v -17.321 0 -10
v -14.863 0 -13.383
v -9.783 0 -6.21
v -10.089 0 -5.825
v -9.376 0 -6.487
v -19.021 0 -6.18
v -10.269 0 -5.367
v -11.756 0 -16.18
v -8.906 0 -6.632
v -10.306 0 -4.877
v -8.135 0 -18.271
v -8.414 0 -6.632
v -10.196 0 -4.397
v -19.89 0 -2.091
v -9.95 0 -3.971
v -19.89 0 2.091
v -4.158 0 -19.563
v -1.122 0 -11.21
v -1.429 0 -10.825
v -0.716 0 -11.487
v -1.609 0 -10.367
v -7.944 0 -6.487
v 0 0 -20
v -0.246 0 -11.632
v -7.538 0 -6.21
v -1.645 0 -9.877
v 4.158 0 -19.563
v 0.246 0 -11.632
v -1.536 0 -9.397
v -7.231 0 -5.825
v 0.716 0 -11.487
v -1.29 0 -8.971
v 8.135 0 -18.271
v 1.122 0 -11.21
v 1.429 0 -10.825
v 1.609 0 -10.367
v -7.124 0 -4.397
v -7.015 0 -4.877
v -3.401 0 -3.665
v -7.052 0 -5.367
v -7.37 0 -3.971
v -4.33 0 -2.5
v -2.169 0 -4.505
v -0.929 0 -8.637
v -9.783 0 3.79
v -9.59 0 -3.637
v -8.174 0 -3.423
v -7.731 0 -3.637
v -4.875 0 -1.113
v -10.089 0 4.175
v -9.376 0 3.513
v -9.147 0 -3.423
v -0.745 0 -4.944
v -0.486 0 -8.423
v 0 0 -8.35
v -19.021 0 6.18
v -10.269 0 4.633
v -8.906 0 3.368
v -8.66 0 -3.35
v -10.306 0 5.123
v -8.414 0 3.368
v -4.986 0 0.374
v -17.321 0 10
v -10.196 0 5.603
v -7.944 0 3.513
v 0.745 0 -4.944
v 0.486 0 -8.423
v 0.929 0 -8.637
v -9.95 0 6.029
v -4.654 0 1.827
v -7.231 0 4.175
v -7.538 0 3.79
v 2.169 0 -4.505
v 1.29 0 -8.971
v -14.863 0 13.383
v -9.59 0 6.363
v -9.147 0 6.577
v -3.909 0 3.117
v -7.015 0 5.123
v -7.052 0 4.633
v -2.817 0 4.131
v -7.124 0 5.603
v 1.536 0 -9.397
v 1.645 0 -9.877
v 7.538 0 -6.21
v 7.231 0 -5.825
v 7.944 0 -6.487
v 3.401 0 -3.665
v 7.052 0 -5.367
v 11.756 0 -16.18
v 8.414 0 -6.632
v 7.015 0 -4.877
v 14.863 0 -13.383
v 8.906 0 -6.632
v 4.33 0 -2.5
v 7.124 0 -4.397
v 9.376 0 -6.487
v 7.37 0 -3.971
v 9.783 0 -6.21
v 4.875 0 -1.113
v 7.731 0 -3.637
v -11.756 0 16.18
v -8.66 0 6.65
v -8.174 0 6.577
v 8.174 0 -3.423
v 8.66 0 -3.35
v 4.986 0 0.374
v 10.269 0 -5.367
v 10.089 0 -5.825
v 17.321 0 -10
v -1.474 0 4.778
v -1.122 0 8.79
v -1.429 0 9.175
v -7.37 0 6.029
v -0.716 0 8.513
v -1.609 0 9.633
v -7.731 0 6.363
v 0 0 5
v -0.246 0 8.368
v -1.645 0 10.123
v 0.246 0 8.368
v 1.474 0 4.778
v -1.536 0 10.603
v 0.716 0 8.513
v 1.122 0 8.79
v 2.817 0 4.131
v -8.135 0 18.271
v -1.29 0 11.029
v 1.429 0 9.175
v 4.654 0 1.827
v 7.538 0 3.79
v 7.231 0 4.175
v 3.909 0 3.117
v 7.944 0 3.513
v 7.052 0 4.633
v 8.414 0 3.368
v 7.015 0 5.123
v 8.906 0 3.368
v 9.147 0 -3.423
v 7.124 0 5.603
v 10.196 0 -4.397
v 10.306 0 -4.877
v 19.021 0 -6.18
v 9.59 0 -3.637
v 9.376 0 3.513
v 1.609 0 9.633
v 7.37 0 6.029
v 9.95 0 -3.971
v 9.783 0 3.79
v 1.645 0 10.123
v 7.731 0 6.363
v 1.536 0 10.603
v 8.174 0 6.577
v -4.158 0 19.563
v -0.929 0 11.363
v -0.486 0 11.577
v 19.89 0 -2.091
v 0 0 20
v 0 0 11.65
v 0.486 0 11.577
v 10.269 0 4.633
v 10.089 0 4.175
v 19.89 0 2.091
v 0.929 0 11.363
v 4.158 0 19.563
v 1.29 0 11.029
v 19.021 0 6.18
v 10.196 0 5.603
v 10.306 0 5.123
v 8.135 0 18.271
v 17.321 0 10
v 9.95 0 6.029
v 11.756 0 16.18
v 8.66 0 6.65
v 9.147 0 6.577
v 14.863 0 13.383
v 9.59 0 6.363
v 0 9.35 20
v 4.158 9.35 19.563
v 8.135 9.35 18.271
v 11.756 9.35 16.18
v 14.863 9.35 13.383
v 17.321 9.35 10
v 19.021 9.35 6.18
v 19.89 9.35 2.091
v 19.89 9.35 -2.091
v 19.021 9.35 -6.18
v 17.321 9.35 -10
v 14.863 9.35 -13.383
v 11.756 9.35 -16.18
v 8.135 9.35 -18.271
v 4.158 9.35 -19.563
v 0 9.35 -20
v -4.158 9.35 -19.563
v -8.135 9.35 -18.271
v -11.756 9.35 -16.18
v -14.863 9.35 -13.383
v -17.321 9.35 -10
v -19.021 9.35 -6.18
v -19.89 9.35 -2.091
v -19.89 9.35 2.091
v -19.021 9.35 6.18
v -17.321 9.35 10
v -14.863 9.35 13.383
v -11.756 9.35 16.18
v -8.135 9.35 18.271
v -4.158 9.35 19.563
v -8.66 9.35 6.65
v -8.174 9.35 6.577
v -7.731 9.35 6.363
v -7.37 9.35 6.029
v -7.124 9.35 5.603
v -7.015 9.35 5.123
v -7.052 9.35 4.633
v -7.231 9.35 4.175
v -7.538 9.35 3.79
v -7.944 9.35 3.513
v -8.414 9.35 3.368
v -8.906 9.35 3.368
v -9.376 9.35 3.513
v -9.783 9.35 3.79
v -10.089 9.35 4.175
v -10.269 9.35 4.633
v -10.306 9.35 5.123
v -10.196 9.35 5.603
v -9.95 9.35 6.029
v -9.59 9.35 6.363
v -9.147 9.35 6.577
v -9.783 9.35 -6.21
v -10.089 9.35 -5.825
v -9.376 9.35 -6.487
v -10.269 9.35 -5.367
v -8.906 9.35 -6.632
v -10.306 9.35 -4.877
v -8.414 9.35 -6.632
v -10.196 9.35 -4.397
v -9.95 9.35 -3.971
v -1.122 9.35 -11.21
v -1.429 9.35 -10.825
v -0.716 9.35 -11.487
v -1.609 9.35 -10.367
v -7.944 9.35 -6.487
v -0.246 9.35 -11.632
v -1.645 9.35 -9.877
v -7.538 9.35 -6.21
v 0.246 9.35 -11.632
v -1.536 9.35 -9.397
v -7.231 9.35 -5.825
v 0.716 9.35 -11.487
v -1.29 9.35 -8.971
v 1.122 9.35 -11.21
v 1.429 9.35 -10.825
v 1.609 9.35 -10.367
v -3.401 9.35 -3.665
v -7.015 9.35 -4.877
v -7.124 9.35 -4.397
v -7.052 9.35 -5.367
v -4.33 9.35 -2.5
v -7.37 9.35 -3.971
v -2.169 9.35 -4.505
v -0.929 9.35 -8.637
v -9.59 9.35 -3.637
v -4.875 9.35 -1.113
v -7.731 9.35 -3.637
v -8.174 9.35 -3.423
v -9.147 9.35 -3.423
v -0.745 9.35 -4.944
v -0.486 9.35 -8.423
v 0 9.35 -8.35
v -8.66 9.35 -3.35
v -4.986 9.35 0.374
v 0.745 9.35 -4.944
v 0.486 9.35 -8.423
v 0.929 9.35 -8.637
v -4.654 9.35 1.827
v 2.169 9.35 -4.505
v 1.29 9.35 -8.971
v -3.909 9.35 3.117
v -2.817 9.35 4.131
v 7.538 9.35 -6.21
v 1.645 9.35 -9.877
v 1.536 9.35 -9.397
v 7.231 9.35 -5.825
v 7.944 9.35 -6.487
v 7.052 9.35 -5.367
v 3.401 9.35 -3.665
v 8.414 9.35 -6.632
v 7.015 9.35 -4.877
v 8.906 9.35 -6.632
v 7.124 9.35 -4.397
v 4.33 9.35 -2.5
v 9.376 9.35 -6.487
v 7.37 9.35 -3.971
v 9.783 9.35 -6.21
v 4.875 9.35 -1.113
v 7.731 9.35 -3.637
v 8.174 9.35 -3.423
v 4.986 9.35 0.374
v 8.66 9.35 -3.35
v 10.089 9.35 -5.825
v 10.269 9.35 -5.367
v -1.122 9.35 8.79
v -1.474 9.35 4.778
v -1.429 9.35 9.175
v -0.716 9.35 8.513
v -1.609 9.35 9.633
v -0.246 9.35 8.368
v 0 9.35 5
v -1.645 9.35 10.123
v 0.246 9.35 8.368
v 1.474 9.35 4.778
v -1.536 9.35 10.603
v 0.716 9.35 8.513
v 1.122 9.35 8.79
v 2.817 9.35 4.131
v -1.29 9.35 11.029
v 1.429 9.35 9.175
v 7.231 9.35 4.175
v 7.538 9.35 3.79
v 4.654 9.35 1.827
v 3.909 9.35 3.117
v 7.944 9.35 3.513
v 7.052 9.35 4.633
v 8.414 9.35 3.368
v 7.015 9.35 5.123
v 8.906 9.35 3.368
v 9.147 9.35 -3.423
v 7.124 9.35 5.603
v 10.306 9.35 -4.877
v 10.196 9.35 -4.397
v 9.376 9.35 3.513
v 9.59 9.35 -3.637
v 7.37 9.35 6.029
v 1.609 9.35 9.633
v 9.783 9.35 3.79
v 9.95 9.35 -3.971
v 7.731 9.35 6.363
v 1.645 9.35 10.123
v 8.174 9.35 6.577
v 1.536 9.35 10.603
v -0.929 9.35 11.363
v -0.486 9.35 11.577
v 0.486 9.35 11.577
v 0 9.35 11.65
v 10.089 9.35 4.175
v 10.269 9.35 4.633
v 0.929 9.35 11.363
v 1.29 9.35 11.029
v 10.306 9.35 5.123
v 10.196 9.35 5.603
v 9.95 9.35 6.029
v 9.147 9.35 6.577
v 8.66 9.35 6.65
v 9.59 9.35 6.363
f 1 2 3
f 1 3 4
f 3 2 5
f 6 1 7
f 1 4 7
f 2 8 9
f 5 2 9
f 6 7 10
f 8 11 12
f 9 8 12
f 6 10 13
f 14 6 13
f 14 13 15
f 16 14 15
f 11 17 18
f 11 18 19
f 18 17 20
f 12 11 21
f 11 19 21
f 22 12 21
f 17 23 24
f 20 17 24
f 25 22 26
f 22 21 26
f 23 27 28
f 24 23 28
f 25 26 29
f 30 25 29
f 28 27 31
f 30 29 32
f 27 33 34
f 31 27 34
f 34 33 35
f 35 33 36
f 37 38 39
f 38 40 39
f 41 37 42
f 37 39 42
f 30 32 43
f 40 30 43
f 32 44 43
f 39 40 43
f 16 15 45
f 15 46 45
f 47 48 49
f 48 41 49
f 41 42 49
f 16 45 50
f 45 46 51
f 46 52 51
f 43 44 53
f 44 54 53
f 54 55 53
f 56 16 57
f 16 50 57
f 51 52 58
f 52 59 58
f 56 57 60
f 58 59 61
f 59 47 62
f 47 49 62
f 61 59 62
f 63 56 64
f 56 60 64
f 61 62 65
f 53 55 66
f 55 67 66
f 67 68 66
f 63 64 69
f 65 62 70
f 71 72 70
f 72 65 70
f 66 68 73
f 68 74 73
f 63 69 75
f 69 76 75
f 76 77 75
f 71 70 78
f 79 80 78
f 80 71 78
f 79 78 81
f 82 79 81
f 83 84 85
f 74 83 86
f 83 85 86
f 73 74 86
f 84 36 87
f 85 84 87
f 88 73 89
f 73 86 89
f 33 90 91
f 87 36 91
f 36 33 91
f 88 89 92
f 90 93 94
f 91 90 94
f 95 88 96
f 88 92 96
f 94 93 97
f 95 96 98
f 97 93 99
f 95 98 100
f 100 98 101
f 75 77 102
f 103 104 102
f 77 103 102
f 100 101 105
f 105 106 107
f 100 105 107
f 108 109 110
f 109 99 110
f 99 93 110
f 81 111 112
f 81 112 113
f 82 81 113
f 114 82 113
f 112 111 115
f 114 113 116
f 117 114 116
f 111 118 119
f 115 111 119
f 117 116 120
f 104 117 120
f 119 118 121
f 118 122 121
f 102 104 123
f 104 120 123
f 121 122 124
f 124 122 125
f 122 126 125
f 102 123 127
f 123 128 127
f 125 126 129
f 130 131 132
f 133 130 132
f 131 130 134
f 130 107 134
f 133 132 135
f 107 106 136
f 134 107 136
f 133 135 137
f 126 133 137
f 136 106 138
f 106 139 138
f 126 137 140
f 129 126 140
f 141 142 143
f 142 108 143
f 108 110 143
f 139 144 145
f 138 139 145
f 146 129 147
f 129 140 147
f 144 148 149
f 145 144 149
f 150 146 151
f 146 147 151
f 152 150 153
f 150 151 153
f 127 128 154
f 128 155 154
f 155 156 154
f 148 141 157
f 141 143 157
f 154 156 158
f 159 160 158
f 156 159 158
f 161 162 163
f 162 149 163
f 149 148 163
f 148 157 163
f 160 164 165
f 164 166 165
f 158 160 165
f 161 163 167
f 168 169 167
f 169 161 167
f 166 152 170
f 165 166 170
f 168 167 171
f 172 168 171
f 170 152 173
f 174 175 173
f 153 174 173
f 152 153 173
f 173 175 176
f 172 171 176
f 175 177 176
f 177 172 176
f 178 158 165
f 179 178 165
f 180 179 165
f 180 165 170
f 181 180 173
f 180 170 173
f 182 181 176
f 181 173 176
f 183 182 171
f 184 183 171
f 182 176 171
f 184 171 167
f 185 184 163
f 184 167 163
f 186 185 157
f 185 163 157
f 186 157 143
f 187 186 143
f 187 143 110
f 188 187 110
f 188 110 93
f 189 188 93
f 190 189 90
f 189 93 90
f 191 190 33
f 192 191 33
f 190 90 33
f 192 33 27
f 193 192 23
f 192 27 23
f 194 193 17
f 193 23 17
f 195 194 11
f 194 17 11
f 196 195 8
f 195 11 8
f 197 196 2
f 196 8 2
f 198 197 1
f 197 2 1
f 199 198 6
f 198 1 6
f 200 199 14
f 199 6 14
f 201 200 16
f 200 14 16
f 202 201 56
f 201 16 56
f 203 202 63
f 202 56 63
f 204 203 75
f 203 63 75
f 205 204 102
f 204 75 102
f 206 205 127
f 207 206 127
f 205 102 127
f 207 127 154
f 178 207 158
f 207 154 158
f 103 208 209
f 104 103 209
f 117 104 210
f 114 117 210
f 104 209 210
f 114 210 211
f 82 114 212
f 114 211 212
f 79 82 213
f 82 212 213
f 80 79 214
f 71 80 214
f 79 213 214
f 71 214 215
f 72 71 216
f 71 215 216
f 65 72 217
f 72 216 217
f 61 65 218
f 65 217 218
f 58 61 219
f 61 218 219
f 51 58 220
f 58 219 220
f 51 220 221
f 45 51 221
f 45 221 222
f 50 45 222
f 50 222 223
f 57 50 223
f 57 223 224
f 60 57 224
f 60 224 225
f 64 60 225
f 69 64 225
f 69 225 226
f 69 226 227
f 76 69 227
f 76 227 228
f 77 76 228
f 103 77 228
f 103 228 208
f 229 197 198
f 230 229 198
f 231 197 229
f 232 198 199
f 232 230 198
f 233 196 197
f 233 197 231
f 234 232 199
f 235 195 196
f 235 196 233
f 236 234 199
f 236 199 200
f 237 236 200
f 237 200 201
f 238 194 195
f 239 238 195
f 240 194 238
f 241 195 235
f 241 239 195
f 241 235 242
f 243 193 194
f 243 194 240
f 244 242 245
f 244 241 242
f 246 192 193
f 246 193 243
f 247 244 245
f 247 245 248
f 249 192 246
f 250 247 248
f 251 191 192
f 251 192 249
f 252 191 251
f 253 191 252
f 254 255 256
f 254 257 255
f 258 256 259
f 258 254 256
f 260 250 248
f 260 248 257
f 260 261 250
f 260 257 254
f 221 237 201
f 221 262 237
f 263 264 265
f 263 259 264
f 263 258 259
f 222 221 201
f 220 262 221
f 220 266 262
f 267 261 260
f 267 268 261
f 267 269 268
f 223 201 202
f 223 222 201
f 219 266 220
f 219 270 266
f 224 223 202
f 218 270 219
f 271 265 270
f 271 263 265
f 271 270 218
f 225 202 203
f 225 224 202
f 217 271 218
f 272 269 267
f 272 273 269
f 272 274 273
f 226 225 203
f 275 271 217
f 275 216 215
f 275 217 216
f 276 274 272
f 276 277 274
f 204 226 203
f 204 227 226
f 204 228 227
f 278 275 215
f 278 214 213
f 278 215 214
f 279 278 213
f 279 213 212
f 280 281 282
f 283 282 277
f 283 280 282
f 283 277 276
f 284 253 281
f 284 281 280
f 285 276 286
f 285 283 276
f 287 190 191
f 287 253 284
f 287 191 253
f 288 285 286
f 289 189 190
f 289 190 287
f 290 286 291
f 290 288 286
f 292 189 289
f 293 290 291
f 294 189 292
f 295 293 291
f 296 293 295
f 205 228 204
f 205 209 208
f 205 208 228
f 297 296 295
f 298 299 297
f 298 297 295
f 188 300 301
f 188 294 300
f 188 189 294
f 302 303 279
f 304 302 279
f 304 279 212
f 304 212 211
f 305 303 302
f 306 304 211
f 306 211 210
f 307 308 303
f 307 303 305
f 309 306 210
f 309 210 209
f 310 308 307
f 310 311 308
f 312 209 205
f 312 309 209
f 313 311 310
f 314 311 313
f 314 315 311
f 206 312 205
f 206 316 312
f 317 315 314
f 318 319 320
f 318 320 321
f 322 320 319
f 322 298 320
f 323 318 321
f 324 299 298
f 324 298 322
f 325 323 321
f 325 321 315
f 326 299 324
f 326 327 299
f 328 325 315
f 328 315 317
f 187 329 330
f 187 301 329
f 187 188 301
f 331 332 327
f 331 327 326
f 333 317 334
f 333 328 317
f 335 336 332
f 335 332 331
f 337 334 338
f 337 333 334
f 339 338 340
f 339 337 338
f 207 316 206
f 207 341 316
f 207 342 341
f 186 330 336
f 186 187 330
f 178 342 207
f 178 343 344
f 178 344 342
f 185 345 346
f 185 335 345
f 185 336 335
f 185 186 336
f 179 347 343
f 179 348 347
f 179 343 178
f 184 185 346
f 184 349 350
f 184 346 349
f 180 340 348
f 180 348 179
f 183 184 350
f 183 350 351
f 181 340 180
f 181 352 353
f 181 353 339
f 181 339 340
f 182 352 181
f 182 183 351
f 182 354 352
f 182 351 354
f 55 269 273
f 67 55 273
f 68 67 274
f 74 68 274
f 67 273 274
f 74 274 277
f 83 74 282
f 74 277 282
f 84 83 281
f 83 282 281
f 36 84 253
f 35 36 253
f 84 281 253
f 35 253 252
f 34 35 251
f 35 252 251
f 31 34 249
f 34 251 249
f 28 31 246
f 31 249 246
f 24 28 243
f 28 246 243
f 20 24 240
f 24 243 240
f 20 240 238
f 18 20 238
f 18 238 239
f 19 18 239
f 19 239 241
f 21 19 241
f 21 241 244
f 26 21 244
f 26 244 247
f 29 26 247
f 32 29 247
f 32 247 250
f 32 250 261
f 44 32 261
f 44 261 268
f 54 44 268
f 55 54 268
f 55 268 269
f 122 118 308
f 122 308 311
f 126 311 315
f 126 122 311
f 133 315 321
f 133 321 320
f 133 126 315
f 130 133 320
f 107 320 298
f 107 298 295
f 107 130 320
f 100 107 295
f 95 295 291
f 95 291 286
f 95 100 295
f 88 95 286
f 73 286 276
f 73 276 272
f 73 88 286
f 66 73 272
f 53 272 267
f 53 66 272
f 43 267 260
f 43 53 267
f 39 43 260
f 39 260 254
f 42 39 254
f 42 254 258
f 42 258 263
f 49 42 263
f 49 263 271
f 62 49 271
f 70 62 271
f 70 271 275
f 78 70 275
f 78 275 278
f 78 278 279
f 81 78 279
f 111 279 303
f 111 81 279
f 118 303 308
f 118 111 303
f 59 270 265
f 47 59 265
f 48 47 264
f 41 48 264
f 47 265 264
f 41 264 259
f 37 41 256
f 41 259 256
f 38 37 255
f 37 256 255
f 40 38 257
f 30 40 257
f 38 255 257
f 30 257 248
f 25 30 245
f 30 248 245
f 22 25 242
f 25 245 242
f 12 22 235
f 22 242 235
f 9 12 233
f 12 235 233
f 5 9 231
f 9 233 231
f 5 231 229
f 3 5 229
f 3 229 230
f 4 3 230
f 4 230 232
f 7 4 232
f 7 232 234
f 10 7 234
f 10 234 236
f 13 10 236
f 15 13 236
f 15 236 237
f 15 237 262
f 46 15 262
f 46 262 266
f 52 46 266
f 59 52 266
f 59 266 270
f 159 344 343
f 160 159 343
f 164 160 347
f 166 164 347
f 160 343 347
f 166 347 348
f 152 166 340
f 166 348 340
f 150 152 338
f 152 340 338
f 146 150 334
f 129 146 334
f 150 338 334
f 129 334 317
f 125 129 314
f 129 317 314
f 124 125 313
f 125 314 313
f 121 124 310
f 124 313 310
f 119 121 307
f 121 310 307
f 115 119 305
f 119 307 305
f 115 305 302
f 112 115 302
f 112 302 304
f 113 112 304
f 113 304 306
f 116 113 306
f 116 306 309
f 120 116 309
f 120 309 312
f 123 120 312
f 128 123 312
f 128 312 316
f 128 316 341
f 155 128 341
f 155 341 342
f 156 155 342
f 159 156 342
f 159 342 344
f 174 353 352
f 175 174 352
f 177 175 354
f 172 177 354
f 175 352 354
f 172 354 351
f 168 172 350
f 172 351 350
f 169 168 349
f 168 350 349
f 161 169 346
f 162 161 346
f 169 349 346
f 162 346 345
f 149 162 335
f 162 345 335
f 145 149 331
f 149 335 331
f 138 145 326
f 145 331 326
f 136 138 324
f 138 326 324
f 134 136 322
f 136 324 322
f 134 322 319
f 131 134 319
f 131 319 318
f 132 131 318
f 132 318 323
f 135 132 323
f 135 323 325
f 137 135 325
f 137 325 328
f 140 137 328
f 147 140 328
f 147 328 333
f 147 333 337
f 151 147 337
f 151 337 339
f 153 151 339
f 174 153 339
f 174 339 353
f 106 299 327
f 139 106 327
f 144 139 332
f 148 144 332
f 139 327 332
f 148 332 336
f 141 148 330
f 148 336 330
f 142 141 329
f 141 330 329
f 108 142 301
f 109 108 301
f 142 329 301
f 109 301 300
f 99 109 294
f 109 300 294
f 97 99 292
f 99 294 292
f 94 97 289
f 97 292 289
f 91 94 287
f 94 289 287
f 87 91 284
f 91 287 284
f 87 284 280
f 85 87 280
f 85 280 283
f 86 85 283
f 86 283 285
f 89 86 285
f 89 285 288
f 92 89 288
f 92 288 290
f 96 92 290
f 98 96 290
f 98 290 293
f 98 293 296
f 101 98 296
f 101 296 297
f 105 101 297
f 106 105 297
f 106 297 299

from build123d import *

# Parameters (mm, degrees)
SKETCH1_R             = 20
SKETCH1_R_2           = 1
SKETCH1_R_3           = 5
BOSS_EXTRUDE1_DEPTH   = 9.35
M4X0_7_TAPPED_HOLE1_D = 3.3


with BuildPart() as part:
    # Sketch1 → Boss-Extrude1 (new body)
    with BuildSketch(Plane(origin=(0, 0, 0), x_dir=(1, 0, 0), z_dir=(0, 1, 0))):
        Circle(SKETCH1_R)
        with Locations((0, 10)):
            Circle(SKETCH1_R_2, mode=Mode.SUBTRACT)
        with Locations((8.660254038, 5)):
            Circle(SKETCH1_R_2, mode=Mode.SUBTRACT)
        with Locations((8.660254038, -5)):
            Circle(SKETCH1_R_2, mode=Mode.SUBTRACT)
        with Locations((0, -10)):
            Circle(SKETCH1_R_2, mode=Mode.SUBTRACT)
        with Locations((-8.660254038, -5)):
            Circle(SKETCH1_R_2, mode=Mode.SUBTRACT)
        with Locations((-8.660254038, 5)):
            Circle(SKETCH1_R_2, mode=Mode.SUBTRACT)
        Circle(SKETCH1_R_3, mode=Mode.SUBTRACT)
    extrude(amount=BOSS_EXTRUDE1_DEPTH)

    # M4x0.7 Tapped Hole1 (through all)
    with Locations(Plane(origin=(-8.660254038, 0, 5), x_dir=(0, 0, -1), z_dir=(0, -1, 0))):
        with Locations((0, 0), (-5, 8.660254038), (0, 17.320508076), (10, 17.320508076), (15, 8.660254038), (10, 0)):
            Hole(M4X0_7_TAPPED_HOLE1_D / 2)


solid = part.part
